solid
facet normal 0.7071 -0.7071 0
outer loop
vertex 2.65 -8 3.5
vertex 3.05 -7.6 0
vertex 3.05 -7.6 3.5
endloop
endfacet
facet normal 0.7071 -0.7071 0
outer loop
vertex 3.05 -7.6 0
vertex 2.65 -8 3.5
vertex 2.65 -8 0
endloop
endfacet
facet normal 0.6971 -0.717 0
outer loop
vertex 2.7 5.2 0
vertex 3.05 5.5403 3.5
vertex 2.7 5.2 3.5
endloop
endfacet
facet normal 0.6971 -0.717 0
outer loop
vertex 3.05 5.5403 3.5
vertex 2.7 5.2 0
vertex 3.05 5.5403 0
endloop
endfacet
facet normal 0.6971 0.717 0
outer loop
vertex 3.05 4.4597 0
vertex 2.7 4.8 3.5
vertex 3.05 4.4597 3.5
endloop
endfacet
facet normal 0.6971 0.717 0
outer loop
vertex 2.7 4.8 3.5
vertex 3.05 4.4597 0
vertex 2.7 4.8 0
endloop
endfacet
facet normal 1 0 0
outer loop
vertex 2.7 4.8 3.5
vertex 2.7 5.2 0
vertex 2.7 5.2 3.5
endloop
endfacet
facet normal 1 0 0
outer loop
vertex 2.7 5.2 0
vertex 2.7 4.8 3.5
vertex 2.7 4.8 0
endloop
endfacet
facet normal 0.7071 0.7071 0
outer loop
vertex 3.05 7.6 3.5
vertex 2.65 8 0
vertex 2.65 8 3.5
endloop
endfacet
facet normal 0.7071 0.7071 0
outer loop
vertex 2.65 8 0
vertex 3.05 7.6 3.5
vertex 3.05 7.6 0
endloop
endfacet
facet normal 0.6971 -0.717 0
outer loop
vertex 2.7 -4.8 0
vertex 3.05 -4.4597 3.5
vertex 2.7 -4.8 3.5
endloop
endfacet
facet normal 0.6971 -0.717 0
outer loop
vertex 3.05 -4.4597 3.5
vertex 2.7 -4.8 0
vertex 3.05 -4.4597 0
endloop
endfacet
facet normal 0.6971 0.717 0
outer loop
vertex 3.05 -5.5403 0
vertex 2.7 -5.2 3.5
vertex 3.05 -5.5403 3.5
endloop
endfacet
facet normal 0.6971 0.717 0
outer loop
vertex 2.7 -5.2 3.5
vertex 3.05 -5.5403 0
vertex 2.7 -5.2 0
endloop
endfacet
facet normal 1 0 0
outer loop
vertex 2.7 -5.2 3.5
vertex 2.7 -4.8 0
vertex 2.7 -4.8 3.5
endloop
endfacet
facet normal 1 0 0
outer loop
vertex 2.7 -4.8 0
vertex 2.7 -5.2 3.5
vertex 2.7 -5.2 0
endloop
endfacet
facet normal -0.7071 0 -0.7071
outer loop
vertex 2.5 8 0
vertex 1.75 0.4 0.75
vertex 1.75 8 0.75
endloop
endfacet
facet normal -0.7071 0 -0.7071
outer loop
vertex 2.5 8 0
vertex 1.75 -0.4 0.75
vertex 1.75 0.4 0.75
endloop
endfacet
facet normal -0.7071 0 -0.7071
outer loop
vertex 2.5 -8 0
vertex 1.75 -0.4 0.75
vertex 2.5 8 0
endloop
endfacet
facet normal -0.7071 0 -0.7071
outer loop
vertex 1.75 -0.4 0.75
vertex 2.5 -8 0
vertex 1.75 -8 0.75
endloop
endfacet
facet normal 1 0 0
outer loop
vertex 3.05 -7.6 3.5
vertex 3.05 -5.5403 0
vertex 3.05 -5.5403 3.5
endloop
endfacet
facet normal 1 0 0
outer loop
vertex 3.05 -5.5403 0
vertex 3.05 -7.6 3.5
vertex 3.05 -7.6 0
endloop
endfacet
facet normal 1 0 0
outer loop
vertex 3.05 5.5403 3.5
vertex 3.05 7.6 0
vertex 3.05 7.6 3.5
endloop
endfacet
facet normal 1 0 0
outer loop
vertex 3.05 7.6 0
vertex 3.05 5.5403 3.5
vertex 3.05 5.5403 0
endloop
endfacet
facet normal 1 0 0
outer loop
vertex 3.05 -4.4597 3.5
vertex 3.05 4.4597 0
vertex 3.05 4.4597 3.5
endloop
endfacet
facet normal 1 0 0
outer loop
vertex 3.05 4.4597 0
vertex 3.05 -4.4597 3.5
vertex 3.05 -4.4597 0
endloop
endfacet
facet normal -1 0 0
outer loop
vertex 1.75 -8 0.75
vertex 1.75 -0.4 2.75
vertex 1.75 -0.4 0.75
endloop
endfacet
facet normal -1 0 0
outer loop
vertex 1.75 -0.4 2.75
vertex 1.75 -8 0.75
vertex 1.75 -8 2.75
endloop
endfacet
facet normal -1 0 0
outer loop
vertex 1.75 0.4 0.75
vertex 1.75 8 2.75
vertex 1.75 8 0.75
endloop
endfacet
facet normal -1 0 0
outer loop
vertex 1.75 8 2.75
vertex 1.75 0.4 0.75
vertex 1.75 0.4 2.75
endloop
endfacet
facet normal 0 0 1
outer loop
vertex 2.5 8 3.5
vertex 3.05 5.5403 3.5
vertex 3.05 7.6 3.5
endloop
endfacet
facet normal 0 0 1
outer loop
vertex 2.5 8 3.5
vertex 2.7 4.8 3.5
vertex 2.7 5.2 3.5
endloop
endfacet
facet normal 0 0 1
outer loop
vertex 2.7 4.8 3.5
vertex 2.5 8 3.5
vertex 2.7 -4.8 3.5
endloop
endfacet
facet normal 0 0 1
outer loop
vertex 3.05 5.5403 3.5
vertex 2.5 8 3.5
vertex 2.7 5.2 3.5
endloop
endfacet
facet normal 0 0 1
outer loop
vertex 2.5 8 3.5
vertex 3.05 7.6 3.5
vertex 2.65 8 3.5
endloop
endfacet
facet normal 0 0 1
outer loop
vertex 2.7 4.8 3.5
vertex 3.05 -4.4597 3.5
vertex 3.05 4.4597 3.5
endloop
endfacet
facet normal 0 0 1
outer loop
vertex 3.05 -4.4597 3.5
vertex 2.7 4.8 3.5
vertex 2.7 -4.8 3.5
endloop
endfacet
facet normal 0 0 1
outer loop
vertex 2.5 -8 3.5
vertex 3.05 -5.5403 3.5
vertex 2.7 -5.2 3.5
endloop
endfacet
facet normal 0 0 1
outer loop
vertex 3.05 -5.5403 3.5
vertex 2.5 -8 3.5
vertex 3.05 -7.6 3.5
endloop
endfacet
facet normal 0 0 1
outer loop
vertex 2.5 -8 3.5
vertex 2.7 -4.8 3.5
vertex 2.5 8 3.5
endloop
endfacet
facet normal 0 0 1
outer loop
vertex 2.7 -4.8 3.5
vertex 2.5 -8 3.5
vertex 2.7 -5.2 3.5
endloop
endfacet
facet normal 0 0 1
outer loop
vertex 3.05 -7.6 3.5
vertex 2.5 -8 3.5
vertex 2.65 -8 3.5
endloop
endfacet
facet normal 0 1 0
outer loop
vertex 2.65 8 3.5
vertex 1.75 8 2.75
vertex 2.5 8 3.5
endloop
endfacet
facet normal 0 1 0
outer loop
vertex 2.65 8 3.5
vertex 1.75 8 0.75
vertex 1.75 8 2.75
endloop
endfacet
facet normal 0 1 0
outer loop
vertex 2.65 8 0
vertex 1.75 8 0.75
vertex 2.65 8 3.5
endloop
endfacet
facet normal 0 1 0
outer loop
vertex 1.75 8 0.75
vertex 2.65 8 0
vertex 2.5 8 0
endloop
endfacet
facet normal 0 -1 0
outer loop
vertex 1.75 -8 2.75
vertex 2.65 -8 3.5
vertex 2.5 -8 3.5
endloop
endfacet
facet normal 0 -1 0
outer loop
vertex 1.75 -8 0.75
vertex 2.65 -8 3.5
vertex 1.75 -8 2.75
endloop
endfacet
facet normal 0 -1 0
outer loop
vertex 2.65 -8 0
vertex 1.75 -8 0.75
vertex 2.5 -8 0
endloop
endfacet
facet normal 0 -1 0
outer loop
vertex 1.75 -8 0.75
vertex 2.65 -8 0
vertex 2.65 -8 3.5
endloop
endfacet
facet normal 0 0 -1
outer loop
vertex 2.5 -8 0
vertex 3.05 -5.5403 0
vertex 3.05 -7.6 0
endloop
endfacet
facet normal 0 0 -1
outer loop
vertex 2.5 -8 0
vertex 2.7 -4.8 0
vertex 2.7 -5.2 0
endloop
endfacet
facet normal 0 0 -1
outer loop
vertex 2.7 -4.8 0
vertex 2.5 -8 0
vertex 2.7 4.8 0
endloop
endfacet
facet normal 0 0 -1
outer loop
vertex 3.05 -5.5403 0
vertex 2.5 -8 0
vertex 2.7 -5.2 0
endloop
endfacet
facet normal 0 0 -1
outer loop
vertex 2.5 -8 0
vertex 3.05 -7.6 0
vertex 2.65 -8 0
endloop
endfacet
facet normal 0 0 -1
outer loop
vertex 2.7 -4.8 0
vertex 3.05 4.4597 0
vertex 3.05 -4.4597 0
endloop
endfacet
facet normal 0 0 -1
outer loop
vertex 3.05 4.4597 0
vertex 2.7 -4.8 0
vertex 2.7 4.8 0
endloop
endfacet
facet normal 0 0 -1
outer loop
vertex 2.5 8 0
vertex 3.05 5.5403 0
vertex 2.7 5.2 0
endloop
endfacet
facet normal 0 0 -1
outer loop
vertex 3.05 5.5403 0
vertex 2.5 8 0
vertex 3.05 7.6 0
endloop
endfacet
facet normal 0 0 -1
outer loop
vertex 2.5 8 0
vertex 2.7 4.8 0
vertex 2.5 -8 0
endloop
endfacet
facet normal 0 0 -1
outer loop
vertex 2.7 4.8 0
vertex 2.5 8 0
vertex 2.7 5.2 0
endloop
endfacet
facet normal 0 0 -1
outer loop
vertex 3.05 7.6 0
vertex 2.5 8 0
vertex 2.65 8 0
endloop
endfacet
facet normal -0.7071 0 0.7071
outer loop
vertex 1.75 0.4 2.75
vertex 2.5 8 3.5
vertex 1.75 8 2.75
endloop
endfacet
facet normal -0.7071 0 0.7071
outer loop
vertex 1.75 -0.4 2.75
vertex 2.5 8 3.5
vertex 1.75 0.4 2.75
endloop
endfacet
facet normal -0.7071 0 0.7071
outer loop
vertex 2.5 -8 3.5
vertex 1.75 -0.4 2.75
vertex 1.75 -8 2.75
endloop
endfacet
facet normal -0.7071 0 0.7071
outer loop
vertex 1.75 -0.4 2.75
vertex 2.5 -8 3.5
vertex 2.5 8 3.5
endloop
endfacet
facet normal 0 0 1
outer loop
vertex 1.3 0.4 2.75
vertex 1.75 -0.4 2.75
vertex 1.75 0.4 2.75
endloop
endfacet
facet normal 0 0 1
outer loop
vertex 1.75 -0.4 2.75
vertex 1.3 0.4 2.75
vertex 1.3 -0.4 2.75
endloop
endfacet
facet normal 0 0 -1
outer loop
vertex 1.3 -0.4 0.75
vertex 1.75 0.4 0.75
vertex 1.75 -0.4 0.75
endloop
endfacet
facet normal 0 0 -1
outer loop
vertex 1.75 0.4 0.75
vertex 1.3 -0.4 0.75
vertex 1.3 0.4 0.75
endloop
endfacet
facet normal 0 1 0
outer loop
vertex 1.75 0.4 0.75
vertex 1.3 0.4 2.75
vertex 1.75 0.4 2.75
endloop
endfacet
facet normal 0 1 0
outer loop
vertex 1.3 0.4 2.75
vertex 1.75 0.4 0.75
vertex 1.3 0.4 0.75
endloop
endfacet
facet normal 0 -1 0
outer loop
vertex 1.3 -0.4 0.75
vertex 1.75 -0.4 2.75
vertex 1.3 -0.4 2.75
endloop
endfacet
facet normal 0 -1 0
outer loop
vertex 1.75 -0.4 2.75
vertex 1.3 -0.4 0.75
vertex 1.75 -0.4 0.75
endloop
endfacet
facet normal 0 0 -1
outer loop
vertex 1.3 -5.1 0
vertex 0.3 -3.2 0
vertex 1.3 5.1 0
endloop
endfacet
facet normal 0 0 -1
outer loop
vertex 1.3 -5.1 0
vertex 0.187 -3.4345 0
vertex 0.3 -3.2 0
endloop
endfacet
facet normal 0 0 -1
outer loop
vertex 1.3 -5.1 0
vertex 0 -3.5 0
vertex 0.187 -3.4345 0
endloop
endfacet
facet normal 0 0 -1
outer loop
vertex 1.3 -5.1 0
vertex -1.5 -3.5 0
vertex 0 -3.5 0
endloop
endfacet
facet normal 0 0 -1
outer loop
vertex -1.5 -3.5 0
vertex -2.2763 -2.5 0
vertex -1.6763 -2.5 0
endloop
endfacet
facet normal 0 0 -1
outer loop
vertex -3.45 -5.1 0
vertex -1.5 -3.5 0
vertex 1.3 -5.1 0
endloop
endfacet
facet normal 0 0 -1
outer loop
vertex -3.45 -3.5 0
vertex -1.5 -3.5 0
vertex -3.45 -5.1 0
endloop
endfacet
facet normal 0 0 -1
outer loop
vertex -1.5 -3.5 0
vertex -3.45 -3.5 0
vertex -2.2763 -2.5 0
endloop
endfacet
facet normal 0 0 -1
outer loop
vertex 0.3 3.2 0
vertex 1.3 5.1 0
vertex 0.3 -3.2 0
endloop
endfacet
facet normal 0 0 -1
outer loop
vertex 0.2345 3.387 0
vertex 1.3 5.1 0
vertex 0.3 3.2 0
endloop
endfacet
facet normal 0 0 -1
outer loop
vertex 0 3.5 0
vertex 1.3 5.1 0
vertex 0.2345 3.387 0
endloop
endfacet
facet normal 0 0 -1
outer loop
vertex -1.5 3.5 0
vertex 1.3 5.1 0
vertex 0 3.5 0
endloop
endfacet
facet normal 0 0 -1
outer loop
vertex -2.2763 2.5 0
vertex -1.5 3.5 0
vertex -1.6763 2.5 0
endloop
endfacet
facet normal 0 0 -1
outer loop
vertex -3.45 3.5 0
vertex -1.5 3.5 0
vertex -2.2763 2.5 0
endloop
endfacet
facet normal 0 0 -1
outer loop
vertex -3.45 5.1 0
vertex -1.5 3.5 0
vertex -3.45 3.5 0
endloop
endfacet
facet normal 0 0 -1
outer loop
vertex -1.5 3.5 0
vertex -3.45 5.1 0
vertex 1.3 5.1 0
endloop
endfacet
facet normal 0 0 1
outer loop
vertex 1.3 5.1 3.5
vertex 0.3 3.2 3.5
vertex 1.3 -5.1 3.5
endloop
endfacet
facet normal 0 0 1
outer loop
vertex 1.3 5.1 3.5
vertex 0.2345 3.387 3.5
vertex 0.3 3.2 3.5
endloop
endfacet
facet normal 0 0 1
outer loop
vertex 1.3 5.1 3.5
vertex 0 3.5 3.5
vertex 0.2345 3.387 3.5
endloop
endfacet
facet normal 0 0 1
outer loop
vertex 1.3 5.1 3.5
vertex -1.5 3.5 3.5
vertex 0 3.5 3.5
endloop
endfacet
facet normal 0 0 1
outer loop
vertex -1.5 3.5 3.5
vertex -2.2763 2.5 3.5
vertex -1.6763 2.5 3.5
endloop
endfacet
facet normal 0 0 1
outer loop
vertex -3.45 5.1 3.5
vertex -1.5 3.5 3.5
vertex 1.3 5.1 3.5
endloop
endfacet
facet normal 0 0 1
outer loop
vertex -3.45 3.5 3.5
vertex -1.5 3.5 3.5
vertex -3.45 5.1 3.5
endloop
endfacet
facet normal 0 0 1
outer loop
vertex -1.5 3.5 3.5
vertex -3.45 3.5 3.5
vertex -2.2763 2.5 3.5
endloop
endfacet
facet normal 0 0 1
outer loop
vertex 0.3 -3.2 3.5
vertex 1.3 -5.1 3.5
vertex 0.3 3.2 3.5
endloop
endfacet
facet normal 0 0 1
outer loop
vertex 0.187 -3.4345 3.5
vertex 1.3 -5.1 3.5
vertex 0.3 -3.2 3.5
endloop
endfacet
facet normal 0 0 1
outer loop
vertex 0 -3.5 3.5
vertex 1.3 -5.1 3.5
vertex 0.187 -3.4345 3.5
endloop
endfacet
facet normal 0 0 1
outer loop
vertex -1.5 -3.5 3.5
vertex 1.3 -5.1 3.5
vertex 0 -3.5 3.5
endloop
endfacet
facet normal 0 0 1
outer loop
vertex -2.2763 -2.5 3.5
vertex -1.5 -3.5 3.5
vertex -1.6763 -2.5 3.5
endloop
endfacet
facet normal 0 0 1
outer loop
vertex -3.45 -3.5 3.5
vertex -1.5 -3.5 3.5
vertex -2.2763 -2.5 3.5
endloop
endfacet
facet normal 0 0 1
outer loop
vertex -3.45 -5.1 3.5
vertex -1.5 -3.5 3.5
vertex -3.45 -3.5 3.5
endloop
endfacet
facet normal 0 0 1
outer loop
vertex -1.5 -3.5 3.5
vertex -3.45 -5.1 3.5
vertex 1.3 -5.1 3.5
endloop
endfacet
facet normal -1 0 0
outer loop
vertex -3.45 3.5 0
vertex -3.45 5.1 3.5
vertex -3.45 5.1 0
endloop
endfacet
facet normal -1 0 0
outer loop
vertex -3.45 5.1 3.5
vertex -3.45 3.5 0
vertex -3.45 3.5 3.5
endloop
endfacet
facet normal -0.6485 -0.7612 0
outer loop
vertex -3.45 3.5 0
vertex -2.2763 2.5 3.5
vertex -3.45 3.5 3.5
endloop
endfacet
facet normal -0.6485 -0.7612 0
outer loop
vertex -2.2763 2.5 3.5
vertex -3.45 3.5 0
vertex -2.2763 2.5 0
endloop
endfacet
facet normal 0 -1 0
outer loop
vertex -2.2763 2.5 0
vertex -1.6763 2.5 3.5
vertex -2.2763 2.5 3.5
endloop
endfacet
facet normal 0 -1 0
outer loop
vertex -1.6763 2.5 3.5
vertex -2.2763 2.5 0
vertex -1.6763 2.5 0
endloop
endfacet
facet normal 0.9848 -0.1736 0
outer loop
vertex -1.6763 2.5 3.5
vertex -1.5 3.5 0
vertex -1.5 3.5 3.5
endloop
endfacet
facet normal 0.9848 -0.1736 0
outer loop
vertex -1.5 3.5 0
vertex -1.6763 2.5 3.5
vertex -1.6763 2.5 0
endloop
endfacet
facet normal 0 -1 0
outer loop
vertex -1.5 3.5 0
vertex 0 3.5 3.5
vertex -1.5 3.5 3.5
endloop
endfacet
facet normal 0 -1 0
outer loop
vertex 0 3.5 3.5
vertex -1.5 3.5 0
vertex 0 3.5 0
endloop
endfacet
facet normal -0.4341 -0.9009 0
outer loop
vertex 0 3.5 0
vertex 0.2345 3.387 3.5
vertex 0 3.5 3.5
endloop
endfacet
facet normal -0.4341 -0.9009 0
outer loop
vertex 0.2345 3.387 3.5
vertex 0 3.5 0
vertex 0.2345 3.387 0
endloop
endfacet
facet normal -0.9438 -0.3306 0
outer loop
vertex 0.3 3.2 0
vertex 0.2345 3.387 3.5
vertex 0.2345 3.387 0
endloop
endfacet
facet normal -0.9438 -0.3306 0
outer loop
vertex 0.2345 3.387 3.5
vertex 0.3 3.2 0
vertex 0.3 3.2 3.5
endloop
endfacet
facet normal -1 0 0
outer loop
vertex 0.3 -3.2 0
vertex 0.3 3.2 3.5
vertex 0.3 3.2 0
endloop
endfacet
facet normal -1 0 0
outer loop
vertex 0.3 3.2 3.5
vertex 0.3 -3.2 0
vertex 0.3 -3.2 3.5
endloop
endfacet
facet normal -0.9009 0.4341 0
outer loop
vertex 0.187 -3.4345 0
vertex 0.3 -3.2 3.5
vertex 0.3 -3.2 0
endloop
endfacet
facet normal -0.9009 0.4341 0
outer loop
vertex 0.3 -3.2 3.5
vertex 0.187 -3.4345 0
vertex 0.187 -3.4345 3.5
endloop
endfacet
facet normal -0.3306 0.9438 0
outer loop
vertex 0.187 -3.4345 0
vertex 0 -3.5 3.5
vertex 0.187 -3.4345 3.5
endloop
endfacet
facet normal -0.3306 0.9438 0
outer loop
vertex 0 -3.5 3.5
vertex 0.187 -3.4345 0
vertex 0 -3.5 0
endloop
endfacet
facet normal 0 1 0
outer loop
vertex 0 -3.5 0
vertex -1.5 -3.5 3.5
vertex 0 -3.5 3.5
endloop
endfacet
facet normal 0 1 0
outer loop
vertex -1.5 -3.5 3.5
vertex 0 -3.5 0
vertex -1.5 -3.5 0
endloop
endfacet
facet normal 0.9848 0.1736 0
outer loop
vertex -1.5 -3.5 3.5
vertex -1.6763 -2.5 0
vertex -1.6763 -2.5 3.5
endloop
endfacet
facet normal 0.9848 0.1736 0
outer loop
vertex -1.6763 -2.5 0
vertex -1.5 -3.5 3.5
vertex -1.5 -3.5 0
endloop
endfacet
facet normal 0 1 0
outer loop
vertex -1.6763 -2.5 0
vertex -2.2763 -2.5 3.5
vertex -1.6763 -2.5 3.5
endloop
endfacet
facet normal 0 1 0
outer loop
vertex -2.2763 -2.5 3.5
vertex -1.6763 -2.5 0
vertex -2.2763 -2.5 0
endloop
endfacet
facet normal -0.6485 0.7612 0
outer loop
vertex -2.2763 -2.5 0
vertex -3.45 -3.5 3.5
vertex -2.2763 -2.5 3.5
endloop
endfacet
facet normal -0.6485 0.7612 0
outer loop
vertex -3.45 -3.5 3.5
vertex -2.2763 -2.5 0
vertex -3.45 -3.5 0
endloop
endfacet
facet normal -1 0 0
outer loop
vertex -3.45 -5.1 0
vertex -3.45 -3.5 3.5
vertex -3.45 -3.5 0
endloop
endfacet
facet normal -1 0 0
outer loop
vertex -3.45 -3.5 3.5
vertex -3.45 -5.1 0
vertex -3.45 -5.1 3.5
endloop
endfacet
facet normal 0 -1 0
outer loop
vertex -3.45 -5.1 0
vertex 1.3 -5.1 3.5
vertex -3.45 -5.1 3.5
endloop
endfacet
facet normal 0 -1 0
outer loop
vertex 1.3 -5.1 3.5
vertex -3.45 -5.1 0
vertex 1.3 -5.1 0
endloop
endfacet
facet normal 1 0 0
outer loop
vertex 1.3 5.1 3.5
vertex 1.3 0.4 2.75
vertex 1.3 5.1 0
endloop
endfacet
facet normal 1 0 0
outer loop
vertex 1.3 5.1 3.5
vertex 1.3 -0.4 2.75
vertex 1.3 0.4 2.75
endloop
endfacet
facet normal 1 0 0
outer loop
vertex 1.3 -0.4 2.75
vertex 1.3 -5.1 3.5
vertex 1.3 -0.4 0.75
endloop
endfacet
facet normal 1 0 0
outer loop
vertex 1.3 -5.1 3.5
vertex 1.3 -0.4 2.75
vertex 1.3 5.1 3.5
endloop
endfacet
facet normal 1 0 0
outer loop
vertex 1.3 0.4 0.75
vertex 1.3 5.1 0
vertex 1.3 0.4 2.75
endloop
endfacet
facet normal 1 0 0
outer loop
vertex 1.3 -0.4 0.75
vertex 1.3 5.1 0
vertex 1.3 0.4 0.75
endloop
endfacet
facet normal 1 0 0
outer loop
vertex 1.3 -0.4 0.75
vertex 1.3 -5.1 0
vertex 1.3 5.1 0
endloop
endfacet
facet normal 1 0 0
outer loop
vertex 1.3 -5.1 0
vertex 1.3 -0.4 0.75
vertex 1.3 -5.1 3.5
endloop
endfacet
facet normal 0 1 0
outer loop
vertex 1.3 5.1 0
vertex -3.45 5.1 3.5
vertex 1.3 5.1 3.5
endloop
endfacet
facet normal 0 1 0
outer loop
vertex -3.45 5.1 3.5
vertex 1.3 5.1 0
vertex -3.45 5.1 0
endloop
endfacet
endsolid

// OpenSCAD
// pin — the dovetail H-pin that holds a charm on a bracelet.
//
// The H-pin's upper half — a crossbar and two legs with hooks pointing in —
// on a DOVETAIL instead of the H's lower legs. The charm snaps down over the
// legs exactly as it did onto the H-pin, into the same two holes. The
// dovetail slides across the band into a groove in a bar and clicks.
//
// PUT THE CHARM ON FIRST, in your hand, then push pin and charm into the bar
// from the band's edge until the pin clicks and sits flush. Once it is in,
// the charm cannot come off: its legs have no room to let go. Push the pin
// out with a toothpick from the other edge first.
//
// THE PIN IS THE SAME BOTH WAYS ROUND: a pit and a lead chamfer under each
// end of the dovetail, so it clicks whichever end goes in first.
//
// PRINT IT ON ITS SIDE, exactly as this file lays it out: the H flat on the
// bed as the H-pin printed, so its hooks are corners of an outline and the
// crossbar — the spring — flexes along its perimeters. The dovetail lies
// beside it on its foot's side; its flank leans out at 45 degrees, and the
// neck bridges 0.45 mm to the crossbar. No support.
//
// All the geometry and every number live in lib/charm-dovetail.scad, and the
// H's in lib/charm-pin.scad, beside the groove and holes they have to match.

$fa = 2;
$fs = 0.3;

include <../../lib/charm-dovetail.scad>

copies  = 1;      // how many to lay out; `-D copies=6` for a batch
spacing = (hp_v_top - dt_bot) + 3;   // centre to centre, side by side

assert(copies >= 1, "copies must be at least 1");

echo(str("dovetail H-pin: ", dt_len, " x ", hp_v_top - dt_bot, " x ", hp_t,
         " mm on its side; neck ", 2*dt_w_lo, " x ", dt_neck_y,
         "; crossbar ", hp_cb_h, " at ", 100*dt_strain_up, "% per charm (x", dt_stiffen,
         " the H-pin's grip); a leg's foot would swing to ", dt_leg_foot,
         " to let a charm go, the channel stops it at ", dt_waist,
         "; leaf bent ", dt_preload, " at rest and ", dt_ride, " going in (",
         100*dt_strain, "%)"));

// Laid on its side: the assembled x (along the band) becomes up, so the H's
// face and the dovetail's foot both land on the bed.
module pin_printed() translate([0, 0, hp_t/2]) rotate([0, -90, 0]) dt_pin();

for (i = [0 : copies - 1])
    translate([i * spacing, 0, 0]) pin_printed();
